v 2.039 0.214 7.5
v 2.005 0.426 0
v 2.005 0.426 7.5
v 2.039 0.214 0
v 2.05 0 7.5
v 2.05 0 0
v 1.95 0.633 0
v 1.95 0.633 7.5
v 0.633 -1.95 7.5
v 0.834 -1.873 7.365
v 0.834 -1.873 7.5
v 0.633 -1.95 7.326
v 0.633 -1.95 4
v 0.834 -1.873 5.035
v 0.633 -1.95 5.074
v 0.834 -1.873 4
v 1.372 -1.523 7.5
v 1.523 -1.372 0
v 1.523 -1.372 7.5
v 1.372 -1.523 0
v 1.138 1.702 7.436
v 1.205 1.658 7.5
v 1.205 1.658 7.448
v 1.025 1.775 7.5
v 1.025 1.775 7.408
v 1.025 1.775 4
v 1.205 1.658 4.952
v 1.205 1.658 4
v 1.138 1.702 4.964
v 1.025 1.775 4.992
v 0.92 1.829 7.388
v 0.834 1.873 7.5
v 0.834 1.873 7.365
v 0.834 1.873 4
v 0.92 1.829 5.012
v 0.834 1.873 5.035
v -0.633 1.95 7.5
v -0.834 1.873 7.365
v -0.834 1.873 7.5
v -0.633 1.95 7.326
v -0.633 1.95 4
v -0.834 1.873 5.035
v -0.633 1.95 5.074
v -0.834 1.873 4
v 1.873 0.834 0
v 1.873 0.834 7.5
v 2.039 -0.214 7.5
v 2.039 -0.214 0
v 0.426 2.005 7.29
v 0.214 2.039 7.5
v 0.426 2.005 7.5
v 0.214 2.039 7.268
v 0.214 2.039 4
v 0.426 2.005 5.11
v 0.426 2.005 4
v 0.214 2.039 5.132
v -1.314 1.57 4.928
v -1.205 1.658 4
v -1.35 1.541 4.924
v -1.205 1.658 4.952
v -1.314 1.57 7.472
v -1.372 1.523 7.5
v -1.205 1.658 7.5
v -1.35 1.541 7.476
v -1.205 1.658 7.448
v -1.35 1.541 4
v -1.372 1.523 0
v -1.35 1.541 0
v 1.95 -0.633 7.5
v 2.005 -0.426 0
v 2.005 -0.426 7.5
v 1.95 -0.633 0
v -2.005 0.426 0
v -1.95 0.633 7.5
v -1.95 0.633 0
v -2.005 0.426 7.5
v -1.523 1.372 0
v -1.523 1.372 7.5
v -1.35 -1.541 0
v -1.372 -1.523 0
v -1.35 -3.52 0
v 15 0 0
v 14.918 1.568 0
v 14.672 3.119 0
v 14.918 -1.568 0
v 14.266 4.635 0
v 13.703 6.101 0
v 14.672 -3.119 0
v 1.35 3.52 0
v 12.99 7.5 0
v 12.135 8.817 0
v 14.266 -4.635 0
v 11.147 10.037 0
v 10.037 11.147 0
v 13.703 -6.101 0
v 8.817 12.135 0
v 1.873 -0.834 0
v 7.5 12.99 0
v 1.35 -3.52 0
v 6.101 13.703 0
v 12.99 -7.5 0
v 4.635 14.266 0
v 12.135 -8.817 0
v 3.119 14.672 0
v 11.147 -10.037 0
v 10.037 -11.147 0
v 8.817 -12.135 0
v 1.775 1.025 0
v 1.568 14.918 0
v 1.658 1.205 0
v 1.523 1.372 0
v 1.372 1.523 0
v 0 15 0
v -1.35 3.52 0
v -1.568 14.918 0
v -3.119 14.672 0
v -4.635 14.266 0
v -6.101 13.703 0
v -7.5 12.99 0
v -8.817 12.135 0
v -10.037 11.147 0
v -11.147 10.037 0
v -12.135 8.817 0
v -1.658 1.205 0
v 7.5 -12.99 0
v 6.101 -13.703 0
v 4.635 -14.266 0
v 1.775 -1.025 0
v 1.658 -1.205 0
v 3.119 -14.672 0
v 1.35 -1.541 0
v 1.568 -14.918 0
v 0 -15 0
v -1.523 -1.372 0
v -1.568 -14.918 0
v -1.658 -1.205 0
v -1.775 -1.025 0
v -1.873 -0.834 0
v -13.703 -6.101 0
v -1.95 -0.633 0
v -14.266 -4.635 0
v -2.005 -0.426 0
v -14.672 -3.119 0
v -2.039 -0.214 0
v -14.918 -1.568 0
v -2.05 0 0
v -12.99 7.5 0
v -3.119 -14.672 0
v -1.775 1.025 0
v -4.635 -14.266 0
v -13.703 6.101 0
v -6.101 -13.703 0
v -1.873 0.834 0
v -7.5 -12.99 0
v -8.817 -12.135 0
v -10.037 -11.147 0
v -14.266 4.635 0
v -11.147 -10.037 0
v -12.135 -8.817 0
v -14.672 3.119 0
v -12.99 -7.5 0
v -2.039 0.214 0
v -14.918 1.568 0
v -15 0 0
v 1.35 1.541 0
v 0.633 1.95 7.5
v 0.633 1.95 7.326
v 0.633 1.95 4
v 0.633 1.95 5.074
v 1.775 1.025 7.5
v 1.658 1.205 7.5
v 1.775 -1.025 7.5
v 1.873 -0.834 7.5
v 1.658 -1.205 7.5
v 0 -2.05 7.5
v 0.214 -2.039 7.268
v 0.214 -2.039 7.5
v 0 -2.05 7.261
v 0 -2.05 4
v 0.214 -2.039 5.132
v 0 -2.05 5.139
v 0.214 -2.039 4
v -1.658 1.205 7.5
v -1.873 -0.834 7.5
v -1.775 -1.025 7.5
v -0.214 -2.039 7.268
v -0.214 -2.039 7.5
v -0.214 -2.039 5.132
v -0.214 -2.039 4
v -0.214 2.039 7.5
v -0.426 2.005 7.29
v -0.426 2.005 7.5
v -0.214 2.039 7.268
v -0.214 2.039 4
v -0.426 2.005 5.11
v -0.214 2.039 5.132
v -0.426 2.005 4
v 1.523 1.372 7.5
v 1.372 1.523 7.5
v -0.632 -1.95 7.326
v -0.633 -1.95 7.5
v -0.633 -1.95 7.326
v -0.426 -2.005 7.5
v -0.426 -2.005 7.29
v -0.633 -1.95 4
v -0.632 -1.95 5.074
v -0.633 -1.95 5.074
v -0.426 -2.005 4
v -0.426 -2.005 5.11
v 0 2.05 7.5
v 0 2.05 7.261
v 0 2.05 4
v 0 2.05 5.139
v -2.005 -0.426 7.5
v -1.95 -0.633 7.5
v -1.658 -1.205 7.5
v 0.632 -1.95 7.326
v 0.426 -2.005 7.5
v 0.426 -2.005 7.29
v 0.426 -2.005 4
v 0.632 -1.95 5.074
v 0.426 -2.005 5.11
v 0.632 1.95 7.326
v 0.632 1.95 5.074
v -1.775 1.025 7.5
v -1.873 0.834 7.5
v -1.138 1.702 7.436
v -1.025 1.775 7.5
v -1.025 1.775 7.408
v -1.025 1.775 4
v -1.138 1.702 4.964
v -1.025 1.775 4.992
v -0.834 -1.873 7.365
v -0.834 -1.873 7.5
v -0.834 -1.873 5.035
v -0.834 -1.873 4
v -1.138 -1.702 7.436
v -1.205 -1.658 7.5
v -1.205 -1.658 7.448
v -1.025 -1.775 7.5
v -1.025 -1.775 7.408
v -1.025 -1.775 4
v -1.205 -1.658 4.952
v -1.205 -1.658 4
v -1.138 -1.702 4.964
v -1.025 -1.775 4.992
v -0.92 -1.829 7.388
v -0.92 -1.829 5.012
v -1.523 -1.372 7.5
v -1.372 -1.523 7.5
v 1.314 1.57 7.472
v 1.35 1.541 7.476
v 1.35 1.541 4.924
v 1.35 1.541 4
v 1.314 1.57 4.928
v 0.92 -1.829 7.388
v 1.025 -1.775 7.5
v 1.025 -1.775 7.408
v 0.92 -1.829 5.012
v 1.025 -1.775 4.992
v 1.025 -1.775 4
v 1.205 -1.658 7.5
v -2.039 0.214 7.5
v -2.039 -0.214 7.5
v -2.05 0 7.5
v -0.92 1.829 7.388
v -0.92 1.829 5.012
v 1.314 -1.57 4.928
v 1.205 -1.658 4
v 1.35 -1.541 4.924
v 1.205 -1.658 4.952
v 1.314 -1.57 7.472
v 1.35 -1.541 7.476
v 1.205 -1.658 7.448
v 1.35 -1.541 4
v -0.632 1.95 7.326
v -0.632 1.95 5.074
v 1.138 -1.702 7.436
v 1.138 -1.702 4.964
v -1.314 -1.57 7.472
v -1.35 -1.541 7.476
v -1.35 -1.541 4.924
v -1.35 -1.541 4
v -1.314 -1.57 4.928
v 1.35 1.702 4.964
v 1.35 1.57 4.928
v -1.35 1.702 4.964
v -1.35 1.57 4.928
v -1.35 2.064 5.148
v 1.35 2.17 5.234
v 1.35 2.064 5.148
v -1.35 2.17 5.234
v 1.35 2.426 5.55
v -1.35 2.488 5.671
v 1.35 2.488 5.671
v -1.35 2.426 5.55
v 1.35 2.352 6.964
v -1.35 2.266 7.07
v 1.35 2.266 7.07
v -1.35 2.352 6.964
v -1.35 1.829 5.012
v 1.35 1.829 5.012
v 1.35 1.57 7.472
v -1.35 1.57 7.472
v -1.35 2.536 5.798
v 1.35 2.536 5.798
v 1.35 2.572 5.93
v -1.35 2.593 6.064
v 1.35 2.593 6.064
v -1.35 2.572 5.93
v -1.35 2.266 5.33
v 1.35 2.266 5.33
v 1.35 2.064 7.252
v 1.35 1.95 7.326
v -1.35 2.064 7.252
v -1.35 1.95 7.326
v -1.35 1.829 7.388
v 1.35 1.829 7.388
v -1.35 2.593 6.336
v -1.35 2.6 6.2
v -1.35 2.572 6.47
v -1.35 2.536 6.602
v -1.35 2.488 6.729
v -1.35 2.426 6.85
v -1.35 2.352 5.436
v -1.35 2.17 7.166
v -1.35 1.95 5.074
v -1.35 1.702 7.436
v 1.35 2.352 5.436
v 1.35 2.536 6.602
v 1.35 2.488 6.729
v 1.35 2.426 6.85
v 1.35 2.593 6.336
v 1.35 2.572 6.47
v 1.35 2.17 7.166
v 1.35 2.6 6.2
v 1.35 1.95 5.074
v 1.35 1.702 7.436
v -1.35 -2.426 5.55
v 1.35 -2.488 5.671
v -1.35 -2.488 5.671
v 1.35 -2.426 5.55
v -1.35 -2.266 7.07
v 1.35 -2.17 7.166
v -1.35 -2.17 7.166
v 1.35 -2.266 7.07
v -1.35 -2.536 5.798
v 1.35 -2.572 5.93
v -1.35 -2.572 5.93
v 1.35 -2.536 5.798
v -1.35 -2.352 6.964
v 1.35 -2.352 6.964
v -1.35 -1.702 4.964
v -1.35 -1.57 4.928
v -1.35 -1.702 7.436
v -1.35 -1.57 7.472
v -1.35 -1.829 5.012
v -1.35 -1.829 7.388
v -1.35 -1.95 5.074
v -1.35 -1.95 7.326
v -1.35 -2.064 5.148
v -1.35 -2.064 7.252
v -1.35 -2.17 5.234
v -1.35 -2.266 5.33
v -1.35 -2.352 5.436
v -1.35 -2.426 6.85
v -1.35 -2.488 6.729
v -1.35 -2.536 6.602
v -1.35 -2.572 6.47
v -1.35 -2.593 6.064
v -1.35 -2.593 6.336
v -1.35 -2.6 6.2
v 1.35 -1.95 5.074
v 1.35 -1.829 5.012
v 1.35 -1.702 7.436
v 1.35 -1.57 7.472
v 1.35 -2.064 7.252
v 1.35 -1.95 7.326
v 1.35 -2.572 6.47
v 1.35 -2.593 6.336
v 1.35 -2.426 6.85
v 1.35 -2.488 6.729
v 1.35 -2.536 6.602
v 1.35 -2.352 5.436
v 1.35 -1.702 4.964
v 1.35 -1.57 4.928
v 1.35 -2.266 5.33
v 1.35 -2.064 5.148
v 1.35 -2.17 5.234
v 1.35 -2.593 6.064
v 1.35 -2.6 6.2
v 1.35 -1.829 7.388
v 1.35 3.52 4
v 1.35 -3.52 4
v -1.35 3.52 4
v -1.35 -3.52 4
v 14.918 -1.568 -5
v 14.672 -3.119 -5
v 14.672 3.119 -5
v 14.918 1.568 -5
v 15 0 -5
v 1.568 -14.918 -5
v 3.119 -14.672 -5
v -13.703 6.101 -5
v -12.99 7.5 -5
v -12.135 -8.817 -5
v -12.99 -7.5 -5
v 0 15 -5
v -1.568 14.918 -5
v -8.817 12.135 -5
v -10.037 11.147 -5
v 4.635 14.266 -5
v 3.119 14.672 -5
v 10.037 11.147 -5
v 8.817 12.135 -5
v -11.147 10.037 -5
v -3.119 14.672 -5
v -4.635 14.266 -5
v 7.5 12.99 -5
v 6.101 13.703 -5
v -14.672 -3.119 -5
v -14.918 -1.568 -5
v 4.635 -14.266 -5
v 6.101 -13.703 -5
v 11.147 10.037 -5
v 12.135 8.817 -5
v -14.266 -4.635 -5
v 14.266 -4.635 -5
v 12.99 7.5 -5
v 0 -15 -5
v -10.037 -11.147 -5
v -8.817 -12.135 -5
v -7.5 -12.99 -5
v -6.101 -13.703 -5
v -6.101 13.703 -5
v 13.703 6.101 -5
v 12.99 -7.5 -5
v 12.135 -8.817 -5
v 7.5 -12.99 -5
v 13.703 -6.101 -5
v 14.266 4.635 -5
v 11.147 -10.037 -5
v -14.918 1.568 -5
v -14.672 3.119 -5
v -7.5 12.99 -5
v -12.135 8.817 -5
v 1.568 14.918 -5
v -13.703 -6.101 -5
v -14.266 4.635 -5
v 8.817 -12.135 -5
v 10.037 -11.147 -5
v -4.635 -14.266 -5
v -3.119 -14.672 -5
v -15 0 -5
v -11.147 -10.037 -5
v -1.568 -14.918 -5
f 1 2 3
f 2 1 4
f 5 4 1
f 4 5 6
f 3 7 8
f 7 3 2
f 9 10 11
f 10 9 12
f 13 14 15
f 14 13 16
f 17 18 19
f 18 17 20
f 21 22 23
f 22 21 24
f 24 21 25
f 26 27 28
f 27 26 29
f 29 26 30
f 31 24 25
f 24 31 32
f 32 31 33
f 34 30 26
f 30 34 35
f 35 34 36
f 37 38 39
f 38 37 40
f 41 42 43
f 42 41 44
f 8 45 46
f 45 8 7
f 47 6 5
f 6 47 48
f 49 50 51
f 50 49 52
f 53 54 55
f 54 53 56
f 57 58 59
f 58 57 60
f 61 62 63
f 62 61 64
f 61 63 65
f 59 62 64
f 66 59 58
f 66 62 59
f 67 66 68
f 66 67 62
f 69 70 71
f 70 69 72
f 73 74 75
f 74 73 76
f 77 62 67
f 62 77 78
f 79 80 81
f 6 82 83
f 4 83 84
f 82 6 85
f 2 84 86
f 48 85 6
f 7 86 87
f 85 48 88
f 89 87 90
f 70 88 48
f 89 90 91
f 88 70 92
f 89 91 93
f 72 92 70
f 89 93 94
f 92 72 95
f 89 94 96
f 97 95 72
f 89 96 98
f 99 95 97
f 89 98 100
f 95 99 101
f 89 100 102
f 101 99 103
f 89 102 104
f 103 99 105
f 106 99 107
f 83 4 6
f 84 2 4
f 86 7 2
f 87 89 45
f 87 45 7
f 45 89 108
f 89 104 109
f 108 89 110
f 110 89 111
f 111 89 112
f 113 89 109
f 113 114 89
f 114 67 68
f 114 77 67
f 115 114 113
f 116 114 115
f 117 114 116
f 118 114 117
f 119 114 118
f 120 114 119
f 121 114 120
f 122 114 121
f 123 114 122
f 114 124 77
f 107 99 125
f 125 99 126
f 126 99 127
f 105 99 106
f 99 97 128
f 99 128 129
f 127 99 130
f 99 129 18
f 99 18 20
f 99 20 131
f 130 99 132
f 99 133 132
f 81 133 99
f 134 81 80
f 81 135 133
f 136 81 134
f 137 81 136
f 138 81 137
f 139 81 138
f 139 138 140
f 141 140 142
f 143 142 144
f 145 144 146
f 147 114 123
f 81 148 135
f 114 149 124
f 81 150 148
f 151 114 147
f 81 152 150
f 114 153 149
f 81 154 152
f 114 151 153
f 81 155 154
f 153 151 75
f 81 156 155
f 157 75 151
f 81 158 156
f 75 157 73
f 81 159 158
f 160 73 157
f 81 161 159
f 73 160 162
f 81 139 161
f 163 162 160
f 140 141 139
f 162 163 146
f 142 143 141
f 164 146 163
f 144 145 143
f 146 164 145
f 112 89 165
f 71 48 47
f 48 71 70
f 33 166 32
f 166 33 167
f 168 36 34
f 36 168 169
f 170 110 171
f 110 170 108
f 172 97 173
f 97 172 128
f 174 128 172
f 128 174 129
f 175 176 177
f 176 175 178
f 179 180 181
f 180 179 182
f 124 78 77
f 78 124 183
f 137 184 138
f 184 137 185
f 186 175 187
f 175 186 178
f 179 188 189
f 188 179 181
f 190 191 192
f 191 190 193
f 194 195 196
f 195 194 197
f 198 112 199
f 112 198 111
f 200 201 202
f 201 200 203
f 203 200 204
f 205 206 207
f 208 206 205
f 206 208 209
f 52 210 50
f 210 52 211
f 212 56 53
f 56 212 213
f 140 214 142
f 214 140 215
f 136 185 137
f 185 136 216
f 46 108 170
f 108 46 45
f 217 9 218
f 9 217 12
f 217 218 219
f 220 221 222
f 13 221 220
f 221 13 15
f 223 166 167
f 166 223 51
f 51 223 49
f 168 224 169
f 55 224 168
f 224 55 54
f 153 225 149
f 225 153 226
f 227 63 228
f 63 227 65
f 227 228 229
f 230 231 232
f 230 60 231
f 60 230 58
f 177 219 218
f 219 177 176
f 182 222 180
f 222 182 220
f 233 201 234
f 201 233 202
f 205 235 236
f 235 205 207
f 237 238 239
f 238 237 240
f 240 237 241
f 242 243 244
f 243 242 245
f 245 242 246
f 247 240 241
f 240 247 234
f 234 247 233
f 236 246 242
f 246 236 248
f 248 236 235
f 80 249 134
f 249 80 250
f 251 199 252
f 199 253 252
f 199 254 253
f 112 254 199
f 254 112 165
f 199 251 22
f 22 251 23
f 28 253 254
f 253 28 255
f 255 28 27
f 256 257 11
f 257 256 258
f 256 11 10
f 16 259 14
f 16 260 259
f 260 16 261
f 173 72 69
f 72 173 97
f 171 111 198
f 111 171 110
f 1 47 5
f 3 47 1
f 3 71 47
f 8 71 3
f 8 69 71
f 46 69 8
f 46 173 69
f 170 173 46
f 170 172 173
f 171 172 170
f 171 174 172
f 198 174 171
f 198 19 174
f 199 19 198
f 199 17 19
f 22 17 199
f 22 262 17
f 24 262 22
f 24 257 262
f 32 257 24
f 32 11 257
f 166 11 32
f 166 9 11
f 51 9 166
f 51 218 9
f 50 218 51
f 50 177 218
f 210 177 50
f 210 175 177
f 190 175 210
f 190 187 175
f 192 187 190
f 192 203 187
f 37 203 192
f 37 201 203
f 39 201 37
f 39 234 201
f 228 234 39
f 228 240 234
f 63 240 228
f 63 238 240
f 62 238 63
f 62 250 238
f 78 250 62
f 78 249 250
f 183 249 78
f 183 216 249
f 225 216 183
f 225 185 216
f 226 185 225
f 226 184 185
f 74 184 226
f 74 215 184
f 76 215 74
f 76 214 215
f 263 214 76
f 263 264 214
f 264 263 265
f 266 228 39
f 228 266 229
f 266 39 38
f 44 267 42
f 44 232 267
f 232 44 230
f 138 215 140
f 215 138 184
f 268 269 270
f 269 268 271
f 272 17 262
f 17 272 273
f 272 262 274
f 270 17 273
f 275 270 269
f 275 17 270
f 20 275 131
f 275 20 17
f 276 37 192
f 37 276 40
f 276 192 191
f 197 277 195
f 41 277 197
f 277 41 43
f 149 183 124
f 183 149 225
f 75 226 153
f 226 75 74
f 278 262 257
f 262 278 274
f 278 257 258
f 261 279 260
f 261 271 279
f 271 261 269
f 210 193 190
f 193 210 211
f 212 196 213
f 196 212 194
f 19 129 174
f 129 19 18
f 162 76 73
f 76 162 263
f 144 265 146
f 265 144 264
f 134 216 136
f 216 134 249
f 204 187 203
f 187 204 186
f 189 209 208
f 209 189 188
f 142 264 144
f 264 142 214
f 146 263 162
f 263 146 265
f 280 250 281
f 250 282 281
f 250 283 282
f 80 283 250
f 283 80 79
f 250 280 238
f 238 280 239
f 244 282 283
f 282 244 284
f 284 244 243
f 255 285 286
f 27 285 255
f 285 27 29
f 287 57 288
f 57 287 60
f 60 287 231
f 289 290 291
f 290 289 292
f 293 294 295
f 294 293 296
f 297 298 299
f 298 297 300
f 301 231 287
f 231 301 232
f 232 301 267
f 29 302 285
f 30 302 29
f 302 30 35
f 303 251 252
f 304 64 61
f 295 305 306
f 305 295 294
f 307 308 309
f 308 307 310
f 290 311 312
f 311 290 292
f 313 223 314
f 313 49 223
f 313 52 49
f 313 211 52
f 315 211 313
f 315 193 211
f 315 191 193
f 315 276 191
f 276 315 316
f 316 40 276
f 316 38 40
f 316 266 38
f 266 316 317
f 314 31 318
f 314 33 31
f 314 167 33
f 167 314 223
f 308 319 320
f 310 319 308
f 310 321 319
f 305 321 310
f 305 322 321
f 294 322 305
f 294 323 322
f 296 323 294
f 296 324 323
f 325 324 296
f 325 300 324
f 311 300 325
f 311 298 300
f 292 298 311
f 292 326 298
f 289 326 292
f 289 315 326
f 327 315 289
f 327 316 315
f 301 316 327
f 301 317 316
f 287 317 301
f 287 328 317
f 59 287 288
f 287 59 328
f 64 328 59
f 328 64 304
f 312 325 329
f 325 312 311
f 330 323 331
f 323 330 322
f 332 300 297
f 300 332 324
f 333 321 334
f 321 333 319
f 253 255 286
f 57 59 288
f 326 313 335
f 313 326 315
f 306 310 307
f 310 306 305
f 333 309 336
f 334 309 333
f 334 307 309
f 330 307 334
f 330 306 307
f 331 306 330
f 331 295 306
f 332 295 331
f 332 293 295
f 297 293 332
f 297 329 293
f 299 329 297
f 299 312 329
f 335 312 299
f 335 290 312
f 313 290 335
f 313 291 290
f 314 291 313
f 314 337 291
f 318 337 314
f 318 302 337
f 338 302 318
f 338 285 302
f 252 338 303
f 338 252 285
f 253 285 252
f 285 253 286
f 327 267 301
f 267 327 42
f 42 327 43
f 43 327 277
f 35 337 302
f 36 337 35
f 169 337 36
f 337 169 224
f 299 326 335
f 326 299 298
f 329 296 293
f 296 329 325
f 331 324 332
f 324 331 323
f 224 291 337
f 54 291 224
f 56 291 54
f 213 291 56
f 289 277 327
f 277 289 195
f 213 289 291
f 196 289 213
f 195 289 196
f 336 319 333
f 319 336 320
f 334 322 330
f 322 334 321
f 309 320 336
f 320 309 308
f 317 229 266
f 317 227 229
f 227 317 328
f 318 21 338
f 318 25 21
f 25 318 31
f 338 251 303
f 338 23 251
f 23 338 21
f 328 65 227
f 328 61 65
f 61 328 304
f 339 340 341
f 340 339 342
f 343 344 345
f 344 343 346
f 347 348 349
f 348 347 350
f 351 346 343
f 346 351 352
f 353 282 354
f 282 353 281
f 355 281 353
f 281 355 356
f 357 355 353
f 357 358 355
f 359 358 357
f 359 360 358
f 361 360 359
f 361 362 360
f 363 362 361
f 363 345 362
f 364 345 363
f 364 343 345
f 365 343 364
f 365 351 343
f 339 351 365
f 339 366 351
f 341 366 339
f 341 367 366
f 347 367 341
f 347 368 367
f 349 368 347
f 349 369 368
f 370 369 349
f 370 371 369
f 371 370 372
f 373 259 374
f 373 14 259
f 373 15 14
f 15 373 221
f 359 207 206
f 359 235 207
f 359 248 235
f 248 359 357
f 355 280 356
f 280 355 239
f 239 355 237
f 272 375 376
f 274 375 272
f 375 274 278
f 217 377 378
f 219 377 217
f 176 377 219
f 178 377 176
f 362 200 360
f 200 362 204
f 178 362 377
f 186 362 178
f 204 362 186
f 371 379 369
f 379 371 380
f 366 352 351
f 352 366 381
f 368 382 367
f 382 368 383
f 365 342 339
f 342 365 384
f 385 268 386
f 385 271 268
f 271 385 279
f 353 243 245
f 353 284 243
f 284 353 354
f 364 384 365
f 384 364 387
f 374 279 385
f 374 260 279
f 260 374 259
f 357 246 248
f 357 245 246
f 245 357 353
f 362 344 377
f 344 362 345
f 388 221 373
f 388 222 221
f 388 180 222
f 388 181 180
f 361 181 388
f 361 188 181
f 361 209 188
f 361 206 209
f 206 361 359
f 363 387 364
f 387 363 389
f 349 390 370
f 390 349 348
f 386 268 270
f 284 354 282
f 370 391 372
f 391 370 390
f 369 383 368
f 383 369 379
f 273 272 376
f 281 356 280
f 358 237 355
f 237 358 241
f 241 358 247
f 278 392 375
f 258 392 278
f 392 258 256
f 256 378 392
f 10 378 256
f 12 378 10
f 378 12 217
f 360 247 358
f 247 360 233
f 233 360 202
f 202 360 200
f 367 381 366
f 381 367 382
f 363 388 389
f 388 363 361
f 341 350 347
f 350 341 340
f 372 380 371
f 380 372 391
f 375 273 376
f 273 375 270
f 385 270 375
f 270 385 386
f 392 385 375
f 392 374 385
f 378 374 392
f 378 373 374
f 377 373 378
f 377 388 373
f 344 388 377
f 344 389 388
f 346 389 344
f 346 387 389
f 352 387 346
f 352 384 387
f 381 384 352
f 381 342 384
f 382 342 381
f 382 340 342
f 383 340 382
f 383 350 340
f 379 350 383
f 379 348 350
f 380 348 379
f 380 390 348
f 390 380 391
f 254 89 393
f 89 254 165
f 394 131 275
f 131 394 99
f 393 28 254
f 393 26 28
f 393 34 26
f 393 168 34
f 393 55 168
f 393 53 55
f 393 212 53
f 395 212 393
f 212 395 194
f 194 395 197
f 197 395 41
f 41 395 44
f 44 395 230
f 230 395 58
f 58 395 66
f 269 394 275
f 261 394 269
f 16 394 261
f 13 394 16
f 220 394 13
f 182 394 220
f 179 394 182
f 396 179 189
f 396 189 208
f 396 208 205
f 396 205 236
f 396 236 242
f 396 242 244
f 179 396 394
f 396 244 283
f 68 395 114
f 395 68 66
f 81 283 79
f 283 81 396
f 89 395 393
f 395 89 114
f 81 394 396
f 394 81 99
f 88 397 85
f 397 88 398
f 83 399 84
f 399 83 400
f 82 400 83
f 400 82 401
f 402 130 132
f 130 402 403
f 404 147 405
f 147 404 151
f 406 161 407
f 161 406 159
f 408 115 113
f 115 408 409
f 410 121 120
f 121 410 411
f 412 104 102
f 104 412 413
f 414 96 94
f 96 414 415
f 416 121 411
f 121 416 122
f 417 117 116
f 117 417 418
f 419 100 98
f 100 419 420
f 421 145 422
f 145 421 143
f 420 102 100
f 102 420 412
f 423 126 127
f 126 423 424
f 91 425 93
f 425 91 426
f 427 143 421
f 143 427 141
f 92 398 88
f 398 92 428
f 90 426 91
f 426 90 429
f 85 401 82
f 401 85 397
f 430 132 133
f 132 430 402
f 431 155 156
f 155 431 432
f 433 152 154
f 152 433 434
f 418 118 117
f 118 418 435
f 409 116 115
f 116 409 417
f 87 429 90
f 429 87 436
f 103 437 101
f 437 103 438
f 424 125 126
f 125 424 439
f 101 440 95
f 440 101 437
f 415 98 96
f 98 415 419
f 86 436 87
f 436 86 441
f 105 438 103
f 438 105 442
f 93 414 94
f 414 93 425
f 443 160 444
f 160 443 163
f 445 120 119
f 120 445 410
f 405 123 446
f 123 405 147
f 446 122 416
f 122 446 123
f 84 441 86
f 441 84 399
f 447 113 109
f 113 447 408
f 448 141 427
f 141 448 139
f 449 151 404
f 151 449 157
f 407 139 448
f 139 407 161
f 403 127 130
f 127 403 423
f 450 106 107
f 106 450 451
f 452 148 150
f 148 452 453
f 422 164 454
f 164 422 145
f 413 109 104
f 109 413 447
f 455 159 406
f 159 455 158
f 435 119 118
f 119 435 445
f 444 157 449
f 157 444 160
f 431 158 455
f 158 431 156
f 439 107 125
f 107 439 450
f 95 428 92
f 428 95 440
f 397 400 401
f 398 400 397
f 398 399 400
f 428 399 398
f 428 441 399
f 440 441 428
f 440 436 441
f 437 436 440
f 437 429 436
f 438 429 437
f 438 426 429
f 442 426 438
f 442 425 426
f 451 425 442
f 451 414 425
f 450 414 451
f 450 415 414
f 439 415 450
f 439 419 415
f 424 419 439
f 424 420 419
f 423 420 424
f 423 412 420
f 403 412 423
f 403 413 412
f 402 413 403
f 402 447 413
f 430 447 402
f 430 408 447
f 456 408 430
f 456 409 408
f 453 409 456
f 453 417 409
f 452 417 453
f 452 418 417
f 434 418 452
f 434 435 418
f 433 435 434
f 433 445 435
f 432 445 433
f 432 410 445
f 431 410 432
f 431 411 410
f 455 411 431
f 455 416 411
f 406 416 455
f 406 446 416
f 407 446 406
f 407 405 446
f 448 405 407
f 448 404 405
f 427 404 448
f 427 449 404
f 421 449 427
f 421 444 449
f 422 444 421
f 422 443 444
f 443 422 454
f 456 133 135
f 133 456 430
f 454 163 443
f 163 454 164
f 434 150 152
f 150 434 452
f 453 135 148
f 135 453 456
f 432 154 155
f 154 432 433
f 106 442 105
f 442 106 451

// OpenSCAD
$fn = 60;

function getNubRadius() =1.3;
function getPinHeight() = 7.5;
function getFlangeWidth(tolerance)= 2.3 + tolerance;
function getFlangeLength(tolerance)= 6.64 + tolerance;

module CameraMount( 3dPrinterTolerance=.4)
{
	union(){
		//central pin	
		cylinder(getPinHeight(),							// length of the pin
				 (4.5-3dPrinterTolerance)/2, 	// radius of the pin
				 (4.5-3dPrinterTolerance)/2, 	// radius of the pin
				 false);						//non centered
		//nubs			 
		translate([0,getNubRadius(),getPinHeight()-getNubRadius()]){
			rotate([0,90,0]){		 
				cylinder(getFlangeWidth(3dPrinterTolerance),	// length of the pin
					 getNubRadius(), 	// radius of the pin
					 getNubRadius(), 	// radius of the pin
					 true);						//non centered
			 }
		}
		//nubs			 
		translate([0,-getNubRadius(),getPinHeight()-getNubRadius()]){
			rotate([0,90,0]){		 
				cylinder(getFlangeWidth(3dPrinterTolerance),	// length of the pin
					 getNubRadius(), 	// radius of the pin
					 getNubRadius(), 	// radius of the pin
					 true);						//non centered
			 }
		}
		//Flange		 
		translate([getFlangeWidth(3dPrinterTolerance)/-2,getFlangeLength(3dPrinterTolerance)/-2,0]){		 
			cube([	getFlangeWidth(3dPrinterTolerance), 
					getFlangeLength(3dPrinterTolerance), 
					4
				]);
		}		 
		// Landing pad			 
		translate([0,0,-5]){		 
			cylinder(5,							// length of the landing pad
					 15, 	// radius of the landing pad
					 15, 	// radius of the landing pad
					 false);
		}		 
	}		 
	
}

CameraMount();
